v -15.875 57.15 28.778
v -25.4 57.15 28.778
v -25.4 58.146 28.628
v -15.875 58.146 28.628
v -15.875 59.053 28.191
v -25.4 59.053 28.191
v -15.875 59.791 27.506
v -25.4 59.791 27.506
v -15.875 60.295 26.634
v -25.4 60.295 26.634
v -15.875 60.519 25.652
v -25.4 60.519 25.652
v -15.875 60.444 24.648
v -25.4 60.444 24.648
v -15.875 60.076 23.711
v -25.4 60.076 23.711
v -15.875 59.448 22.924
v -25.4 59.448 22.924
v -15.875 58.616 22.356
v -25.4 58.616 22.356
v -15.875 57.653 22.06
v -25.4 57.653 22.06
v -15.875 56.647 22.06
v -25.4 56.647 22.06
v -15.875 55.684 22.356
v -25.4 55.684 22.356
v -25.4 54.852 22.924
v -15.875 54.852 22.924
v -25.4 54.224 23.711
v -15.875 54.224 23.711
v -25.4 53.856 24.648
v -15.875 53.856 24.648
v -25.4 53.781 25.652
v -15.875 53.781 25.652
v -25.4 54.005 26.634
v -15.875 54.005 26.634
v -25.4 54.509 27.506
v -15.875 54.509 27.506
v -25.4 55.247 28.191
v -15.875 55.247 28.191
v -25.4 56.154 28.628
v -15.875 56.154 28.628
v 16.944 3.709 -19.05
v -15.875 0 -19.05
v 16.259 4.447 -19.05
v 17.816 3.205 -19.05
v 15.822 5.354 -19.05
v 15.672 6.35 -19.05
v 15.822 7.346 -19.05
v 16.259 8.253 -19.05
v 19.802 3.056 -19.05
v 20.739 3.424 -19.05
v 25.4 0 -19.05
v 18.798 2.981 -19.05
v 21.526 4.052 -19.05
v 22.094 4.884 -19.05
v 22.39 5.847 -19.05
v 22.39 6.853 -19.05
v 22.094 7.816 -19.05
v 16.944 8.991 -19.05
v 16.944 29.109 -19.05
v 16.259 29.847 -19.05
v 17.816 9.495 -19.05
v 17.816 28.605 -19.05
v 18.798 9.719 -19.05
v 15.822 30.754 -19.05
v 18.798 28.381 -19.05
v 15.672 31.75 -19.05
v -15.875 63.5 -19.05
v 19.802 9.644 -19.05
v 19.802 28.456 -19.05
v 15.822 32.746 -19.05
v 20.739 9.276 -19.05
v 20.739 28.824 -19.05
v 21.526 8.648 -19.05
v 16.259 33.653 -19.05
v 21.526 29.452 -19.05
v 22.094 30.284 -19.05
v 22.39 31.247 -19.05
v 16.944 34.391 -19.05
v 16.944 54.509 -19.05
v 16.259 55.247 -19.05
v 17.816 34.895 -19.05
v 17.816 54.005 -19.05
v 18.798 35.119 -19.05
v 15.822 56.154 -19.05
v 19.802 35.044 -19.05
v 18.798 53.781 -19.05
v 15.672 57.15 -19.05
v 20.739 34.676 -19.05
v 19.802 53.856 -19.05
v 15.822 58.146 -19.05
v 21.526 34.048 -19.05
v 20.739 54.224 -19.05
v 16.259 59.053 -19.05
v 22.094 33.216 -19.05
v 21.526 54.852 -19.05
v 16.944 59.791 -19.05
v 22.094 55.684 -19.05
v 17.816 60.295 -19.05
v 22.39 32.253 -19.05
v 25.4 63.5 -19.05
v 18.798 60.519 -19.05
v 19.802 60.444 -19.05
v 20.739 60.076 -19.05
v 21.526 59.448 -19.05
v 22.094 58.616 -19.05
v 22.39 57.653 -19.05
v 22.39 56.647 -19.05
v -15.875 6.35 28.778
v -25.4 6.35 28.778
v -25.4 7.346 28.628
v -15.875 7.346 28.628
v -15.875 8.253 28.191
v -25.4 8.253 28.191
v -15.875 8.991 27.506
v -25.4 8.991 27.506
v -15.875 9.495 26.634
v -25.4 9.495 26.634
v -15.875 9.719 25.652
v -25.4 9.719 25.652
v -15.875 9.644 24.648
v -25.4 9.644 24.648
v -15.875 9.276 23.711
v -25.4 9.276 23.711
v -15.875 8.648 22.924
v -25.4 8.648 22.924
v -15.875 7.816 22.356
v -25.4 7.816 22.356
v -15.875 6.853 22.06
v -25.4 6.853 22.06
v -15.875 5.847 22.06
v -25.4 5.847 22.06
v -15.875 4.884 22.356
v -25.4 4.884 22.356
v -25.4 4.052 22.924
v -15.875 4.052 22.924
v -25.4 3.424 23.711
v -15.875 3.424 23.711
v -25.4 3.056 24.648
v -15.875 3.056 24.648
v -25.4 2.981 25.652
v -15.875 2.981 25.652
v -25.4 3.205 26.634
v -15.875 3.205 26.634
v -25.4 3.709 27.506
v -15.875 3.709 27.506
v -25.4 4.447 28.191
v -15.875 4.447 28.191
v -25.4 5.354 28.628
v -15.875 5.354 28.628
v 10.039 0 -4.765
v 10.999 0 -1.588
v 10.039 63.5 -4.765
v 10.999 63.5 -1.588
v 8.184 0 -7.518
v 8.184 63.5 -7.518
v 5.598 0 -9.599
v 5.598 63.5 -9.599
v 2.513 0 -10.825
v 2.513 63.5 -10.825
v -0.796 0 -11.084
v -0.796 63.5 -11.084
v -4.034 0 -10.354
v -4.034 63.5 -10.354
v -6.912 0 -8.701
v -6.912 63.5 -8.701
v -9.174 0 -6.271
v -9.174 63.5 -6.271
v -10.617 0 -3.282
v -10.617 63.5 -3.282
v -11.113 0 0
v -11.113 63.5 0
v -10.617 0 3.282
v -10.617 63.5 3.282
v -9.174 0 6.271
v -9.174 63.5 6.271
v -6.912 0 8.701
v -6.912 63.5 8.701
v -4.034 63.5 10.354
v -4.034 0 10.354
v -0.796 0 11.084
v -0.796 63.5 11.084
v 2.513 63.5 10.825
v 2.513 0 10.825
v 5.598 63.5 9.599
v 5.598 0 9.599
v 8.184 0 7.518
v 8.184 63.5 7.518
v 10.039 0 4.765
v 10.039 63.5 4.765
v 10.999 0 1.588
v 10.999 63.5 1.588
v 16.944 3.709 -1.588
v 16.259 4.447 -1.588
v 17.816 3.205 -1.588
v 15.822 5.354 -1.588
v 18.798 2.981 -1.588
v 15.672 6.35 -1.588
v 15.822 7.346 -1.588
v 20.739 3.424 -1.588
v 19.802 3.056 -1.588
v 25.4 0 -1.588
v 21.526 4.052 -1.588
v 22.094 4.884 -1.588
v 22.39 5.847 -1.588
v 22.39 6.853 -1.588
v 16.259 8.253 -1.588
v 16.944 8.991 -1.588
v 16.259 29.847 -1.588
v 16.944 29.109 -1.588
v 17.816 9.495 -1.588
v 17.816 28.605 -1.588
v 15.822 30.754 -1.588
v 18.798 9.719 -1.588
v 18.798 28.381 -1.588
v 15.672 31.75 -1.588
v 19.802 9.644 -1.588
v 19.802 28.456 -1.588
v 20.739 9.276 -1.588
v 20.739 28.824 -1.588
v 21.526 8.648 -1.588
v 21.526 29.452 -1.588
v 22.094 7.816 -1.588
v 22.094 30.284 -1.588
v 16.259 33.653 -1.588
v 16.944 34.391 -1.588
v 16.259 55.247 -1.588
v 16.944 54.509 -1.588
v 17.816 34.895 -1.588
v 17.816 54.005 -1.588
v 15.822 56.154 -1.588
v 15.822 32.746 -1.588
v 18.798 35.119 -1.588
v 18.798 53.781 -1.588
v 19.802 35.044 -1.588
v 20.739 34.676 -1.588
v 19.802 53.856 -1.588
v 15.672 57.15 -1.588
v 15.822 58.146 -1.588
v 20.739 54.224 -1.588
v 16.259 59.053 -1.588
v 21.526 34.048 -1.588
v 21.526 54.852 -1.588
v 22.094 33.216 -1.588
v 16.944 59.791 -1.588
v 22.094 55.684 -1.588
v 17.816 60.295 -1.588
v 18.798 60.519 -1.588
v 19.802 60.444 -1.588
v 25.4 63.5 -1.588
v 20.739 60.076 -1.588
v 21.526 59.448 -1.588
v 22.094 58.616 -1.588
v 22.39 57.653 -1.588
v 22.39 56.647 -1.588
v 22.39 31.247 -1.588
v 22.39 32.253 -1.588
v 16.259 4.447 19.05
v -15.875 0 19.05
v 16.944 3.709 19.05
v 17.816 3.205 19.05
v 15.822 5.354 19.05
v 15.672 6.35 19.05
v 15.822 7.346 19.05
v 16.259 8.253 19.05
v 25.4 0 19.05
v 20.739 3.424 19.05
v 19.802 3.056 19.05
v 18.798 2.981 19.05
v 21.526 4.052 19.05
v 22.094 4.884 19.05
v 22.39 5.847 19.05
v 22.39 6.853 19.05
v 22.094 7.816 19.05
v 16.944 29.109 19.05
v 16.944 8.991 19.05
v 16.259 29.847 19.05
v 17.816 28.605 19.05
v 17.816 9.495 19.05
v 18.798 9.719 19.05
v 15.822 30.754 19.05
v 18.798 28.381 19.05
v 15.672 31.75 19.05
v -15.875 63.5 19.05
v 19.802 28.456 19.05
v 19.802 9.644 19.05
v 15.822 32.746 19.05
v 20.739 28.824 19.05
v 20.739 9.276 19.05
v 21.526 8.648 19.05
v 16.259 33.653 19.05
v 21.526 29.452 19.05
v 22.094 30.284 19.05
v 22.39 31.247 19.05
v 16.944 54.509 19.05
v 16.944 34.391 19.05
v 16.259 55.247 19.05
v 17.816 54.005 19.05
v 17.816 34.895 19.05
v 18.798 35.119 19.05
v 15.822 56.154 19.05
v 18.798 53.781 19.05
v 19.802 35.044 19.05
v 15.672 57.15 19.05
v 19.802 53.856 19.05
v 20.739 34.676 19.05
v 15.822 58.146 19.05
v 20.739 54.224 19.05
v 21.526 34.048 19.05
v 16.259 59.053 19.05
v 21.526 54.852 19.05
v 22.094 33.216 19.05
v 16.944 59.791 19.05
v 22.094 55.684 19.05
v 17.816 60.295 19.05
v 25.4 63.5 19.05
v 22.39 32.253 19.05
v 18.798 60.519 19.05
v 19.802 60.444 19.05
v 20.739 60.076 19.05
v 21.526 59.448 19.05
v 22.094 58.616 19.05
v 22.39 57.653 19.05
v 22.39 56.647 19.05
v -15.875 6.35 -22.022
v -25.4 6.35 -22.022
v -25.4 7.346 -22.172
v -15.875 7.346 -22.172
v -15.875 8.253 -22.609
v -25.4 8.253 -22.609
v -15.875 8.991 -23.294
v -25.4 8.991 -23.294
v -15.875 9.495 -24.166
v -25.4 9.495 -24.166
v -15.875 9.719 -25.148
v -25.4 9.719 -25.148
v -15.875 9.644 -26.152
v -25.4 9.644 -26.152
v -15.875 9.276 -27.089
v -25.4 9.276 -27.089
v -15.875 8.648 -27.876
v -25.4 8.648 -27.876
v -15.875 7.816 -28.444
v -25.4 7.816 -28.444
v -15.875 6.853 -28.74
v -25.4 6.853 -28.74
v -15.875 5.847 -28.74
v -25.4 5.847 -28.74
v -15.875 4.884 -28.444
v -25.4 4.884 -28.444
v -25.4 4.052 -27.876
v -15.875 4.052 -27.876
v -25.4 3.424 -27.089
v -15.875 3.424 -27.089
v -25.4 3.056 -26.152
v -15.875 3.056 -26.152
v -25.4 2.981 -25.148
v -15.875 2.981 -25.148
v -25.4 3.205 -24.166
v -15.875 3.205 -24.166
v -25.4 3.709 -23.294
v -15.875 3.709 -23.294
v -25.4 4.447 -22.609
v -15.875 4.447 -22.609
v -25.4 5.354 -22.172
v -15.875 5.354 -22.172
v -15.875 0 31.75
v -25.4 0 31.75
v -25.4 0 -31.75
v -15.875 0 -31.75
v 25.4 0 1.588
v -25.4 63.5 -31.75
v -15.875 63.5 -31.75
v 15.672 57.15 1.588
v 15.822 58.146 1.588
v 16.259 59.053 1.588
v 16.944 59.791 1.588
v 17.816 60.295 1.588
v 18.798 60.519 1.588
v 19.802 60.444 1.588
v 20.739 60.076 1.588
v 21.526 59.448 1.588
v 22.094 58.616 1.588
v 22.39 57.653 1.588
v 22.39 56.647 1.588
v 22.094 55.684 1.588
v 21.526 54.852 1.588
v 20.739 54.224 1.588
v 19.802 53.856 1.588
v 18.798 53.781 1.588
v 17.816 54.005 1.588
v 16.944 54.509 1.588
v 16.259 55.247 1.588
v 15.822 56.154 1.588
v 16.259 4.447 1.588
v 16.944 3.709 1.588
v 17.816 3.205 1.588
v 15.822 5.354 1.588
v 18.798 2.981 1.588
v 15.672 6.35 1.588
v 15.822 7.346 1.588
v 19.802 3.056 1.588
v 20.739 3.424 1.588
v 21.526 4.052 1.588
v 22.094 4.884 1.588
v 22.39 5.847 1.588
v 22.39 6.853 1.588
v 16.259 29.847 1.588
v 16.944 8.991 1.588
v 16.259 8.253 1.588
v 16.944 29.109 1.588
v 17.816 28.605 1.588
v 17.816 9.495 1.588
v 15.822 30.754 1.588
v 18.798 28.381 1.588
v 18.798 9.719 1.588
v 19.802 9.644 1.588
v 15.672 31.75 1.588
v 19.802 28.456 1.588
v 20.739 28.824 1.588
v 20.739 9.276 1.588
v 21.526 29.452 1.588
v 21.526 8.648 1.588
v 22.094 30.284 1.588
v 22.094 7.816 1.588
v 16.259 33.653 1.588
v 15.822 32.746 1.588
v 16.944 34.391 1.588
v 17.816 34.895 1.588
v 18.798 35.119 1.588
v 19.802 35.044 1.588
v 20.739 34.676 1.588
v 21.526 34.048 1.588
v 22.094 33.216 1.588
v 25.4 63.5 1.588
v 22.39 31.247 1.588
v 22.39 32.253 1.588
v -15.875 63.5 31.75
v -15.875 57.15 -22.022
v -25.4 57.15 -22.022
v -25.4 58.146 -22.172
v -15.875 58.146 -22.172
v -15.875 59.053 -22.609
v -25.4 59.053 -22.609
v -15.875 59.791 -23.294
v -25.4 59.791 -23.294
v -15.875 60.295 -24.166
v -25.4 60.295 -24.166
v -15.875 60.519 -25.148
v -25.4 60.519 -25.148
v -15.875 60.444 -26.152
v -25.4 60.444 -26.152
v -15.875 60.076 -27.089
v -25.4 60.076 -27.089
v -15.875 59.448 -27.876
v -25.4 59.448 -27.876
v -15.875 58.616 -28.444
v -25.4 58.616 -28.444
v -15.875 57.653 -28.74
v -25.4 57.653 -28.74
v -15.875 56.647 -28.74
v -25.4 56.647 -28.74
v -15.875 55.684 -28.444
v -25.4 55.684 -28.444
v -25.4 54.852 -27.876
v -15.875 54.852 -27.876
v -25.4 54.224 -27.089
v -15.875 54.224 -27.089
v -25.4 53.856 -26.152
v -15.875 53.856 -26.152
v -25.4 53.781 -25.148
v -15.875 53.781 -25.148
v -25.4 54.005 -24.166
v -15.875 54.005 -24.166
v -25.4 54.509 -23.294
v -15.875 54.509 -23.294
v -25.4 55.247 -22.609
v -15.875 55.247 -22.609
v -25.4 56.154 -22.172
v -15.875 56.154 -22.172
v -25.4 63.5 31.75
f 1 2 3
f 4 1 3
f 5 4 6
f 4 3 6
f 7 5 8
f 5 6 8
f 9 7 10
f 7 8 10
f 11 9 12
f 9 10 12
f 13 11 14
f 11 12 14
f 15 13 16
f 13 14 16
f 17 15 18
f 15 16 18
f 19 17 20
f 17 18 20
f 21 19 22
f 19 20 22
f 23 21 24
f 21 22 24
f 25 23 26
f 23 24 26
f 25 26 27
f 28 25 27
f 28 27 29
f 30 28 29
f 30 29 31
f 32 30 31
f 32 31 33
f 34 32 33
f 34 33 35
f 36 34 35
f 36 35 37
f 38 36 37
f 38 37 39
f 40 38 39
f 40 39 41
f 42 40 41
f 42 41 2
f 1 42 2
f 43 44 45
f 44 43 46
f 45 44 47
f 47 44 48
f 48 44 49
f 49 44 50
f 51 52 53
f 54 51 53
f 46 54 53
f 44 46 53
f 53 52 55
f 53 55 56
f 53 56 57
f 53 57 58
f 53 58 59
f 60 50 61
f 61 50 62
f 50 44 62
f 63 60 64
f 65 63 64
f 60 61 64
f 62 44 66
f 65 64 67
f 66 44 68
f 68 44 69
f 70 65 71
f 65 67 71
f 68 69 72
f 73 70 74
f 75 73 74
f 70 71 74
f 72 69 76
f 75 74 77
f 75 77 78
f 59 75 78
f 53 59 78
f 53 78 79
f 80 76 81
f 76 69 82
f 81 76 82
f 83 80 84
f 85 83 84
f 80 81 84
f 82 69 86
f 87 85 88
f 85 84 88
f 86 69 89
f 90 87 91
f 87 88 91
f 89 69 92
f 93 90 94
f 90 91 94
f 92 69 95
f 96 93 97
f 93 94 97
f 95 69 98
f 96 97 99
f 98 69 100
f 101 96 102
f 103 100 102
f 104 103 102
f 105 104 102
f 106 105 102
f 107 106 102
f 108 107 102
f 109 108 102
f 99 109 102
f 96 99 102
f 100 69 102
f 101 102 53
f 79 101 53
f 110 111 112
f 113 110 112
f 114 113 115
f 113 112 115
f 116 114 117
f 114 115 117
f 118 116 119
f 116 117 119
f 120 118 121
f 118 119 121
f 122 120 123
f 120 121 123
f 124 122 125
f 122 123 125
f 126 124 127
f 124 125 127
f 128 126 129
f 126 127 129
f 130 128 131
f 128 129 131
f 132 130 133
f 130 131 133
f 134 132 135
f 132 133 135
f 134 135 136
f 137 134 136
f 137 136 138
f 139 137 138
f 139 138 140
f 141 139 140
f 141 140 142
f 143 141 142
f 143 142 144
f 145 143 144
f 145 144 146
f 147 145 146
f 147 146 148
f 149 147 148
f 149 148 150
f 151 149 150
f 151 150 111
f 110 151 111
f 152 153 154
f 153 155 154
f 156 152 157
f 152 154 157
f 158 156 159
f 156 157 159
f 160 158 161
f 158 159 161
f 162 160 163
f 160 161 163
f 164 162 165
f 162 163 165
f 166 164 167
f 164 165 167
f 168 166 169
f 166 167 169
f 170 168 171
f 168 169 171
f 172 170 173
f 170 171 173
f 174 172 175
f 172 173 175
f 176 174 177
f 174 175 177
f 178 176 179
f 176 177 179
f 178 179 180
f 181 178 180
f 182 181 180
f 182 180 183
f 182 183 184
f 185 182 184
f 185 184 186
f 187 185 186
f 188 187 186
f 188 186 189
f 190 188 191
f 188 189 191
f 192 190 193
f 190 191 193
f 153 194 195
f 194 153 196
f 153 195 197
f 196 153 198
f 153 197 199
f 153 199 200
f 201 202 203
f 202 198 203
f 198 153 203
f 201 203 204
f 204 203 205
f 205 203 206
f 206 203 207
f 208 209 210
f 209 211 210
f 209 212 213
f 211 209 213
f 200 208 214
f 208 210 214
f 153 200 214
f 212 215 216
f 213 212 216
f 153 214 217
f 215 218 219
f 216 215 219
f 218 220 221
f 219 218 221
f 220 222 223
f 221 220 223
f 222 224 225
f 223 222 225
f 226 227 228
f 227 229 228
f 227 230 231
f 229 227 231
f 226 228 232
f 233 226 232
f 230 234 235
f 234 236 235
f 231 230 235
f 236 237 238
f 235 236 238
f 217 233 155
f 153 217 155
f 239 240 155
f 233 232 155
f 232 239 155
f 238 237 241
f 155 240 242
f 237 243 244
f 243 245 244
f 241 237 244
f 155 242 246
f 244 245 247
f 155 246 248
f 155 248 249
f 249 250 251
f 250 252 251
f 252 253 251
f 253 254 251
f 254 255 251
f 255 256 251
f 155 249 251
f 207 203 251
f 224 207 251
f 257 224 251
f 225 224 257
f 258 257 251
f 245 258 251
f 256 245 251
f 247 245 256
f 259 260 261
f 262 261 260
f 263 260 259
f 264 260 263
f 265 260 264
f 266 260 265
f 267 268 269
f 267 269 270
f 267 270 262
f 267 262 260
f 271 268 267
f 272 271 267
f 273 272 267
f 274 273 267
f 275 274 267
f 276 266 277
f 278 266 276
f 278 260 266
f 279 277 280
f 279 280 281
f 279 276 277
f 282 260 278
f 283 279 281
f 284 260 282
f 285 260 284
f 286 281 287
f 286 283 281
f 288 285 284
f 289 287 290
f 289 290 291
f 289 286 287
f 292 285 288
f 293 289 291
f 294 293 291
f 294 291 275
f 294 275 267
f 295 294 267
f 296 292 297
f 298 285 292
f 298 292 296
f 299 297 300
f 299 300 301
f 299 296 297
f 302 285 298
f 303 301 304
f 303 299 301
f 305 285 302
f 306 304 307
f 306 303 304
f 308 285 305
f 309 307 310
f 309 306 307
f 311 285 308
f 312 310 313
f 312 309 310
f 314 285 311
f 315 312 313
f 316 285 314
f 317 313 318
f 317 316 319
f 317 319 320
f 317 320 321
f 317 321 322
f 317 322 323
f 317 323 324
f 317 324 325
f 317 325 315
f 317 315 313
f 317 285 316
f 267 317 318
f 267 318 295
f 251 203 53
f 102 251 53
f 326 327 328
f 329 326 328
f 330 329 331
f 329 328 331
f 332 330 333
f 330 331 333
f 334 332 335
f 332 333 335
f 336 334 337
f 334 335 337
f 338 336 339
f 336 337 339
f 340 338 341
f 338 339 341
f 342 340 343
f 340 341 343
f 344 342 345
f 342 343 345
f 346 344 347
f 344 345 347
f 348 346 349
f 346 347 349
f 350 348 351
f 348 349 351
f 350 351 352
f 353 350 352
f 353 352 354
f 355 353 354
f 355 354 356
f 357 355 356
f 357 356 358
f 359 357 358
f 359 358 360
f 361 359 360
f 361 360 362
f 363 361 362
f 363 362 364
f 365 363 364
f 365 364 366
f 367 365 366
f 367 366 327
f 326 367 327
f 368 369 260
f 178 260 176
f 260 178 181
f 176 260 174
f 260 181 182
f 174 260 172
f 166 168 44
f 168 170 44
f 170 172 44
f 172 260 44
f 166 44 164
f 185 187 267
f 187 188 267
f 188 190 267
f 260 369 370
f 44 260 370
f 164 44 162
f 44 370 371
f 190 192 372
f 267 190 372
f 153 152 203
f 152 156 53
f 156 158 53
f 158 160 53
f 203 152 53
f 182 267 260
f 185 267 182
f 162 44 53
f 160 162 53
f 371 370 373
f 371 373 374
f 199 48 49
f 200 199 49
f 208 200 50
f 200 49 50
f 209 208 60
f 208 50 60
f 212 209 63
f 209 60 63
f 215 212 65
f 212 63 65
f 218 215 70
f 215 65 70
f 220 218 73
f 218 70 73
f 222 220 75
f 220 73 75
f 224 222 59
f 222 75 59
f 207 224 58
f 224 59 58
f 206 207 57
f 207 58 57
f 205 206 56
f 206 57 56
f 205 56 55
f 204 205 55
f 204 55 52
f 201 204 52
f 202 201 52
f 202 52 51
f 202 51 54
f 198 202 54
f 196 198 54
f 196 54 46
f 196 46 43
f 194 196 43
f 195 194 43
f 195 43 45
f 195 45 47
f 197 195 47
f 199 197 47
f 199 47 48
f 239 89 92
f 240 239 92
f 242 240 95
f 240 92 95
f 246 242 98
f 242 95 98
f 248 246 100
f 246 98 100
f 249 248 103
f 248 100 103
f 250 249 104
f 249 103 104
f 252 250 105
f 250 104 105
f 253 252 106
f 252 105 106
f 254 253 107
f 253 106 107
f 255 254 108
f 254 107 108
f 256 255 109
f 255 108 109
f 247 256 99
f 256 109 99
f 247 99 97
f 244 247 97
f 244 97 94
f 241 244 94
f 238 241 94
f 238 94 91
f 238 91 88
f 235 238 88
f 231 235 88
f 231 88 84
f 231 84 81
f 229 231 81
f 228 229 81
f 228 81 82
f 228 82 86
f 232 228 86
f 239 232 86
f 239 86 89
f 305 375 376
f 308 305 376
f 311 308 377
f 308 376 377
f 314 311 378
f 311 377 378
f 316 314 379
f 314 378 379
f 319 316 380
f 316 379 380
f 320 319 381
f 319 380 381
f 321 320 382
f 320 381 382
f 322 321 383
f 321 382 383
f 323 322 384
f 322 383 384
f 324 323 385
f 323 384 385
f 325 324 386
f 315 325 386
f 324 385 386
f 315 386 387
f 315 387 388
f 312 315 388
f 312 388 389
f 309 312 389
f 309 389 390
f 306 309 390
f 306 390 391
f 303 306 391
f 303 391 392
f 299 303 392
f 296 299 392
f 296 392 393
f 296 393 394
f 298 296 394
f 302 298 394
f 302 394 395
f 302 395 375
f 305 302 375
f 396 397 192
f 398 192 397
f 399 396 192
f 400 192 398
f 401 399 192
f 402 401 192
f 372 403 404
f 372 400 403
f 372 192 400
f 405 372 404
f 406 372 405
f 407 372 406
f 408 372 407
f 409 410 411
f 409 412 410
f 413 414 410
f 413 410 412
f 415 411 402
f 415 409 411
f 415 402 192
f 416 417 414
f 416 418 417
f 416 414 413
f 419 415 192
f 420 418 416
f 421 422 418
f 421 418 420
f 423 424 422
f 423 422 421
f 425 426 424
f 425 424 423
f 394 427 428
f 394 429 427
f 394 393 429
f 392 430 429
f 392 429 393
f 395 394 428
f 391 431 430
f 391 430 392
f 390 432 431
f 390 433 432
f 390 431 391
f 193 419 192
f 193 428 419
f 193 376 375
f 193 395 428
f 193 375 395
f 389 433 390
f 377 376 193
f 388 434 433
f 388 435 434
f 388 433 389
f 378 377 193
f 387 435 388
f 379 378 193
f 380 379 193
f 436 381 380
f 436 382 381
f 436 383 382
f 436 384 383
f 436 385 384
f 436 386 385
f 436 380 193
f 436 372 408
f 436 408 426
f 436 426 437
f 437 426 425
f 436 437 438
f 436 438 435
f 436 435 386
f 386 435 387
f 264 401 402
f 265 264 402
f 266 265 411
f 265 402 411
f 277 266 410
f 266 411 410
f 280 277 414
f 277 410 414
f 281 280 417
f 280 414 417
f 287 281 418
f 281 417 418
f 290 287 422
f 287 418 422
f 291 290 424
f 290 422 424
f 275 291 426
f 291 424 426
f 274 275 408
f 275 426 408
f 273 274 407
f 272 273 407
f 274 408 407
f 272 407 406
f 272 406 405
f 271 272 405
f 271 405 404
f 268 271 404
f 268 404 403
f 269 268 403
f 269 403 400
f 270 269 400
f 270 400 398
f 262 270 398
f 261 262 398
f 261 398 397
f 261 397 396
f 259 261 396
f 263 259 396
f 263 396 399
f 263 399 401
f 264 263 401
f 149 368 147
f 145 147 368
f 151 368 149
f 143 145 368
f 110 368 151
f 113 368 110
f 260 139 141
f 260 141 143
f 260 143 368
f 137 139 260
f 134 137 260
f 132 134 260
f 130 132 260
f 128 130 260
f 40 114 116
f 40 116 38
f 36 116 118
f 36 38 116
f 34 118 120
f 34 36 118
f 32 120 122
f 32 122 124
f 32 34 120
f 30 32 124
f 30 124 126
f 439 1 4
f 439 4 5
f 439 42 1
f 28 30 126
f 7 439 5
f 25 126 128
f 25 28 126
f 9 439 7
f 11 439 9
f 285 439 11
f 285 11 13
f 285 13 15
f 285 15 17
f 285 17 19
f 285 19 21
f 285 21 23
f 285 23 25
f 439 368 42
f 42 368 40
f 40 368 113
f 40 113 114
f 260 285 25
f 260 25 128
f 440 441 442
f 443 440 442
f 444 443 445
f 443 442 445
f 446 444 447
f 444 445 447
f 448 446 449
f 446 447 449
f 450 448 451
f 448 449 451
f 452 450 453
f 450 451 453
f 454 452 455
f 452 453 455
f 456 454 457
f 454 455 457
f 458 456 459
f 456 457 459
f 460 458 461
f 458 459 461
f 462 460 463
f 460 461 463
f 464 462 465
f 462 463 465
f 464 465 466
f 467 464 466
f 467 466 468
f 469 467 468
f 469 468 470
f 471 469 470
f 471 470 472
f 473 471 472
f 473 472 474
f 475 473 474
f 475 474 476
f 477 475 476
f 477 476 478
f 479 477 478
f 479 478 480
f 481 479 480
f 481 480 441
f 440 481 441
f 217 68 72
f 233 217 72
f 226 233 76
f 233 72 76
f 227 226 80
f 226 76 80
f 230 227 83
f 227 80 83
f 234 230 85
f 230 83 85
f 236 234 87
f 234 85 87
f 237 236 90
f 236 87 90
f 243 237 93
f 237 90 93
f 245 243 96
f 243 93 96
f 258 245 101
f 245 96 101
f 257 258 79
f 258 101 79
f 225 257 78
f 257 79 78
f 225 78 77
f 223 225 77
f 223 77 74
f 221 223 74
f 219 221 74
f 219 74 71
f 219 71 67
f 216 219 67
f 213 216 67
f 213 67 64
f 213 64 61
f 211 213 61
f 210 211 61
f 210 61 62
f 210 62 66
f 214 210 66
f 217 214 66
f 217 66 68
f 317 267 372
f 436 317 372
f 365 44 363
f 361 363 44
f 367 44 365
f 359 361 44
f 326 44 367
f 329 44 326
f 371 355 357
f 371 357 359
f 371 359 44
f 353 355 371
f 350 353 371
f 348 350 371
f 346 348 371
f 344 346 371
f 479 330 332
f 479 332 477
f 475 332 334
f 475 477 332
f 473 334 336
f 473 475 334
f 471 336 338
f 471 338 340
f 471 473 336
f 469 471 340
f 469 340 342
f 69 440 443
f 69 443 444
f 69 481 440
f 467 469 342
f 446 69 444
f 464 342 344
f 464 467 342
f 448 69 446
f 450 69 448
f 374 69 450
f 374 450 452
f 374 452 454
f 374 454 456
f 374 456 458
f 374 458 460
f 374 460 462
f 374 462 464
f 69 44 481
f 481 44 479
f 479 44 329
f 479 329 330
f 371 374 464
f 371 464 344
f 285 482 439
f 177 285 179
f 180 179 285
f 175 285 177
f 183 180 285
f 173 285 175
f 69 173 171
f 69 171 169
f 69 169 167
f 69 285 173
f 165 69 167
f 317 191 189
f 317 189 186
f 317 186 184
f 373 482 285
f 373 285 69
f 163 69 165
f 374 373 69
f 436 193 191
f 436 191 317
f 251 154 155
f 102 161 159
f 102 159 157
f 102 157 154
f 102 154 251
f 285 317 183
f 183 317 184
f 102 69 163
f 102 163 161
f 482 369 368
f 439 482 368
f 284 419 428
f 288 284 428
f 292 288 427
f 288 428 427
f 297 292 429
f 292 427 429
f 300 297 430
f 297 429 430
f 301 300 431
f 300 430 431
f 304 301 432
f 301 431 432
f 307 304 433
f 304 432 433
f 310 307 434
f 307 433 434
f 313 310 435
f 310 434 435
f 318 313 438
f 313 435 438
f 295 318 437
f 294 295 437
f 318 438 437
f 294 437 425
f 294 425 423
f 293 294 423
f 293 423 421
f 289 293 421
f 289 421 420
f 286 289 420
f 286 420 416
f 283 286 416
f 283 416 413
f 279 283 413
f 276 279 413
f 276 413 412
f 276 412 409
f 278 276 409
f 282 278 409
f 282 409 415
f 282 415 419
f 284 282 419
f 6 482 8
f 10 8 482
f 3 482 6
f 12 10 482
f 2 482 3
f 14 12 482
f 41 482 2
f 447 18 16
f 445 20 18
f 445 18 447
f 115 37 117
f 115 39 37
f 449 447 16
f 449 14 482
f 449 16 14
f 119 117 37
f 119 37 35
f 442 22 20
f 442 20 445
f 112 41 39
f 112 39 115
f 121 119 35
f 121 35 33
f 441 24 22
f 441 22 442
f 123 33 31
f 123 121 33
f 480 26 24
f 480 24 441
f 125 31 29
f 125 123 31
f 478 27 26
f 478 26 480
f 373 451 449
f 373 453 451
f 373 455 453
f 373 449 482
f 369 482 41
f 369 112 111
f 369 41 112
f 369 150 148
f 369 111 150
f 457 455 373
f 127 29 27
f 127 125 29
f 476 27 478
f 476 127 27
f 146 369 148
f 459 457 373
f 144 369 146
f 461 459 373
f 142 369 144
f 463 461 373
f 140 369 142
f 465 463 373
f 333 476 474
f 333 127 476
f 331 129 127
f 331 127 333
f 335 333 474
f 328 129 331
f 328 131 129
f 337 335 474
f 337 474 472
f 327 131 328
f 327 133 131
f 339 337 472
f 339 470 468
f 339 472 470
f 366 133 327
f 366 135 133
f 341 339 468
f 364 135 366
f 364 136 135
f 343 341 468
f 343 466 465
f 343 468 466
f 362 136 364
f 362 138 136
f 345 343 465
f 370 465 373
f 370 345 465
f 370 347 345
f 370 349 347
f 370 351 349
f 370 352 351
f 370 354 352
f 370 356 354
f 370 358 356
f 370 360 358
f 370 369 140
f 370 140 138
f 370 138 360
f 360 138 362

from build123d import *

# Parameters (mm, degrees)
SKETCH1_W                   = 50.8
SKETCH1_H                   = 63.5
BOSS_EXTRUDE1_DEPTH         = 63.5
SKETCH2_R                   = 11.1125
CUT_EXTRUDE1_DEPTH          = 76.402072253
SKETCH3_W                   = 41.275
SKETCH3_H                   = 12.7
CUT_EXTRUDE2_DEPTH          = 76.402072253
F_1_4_CLEARANCE_HOLE1_D     = 6.7564
F_1_4_CLEARANCE_HOLE1_DEPTH = 9.652
F_1_4_CLEARANCE_HOLE1_TIP   = 2.029827343
SKETCH6_W                   = 3.175
SKETCH6_H                   = 63.5
CUT_EXTRUDE3_DEPTH          = 24.13
F_1_4_CLEARANCE_HOLE2_D     = 6.7564


with BuildPart() as part:
    # Sketch1 → Boss-Extrude1 (new body)
    with BuildSketch(Plane(origin=(0, 0, 0), x_dir=(1, 0, 0), z_dir=(0, 1, 0))):
        Rectangle(SKETCH1_W, SKETCH1_H)
    extrude(amount=BOSS_EXTRUDE1_DEPTH)

    # Sketch2 → Cut-Extrude1 (cut, through all)
    with BuildSketch(Plane(origin=(0, 63.5, 0), x_dir=(1, 0, 0), z_dir=(0, 1, 0))):
        with Locations(Location((0, 0, 0), (0, 0, 270))):
            Circle(SKETCH2_R)
    extrude(amount=-CUT_EXTRUDE1_DEPTH, mode=Mode.SUBTRACT)

    # Sketch3 → Cut-Extrude2 (cut, through all)
    with BuildSketch(Plane(origin=(0, 63.5, 0), x_dir=(1, 0, 0), z_dir=(0, 1, 0))):
        with Locations((4.7625, 25.4)):
            Rectangle(SKETCH3_W, SKETCH3_H)
        with Locations((4.7625, -25.4)):
            Rectangle(SKETCH3_W, SKETCH3_H)
    extrude(amount=-CUT_EXTRUDE2_DEPTH, mode=Mode.SUBTRACT)

    # 1/4 Clearance Hole1
    with Locations(Plane(origin=(-15.875, 0, 0), x_dir=(0, 0, -1), z_dir=(1, 0, 0))):
        with Locations((-25.4, 57.15), (25.4, 6.35), (-25.4, 6.35), (25.4, 57.15)):
            Hole(F_1_4_CLEARANCE_HOLE1_D / 2, depth=F_1_4_CLEARANCE_HOLE1_DEPTH)
            with Locations((0, 0, -(F_1_4_CLEARANCE_HOLE1_DEPTH + F_1_4_CLEARANCE_HOLE1_TIP / 2))):  # 118° drill point
                Cone(0, F_1_4_CLEARANCE_HOLE1_D / 2, F_1_4_CLEARANCE_HOLE1_TIP, mode=Mode.SUBTRACT)

    # Sketch6 → Cut-Extrude3 (cut)
    with BuildSketch(Plane(origin=(25.4, 0, 0), x_dir=(0, 0, -1), z_dir=(1, 0, 0))):
        with Locations((0, 31.75)):
            Rectangle(SKETCH6_W, SKETCH6_H)
    extrude(amount=-CUT_EXTRUDE3_DEPTH, mode=Mode.SUBTRACT)

    # 1/4 Clearance Hole2 (through all)
    with Locations(Plane.XY.offset(19.05)):
        with Locations((19.05, 57.15), (19.05, 31.75), (19.05, 6.35)):
            Hole(F_1_4_CLEARANCE_HOLE2_D / 2)


solid = part.part
